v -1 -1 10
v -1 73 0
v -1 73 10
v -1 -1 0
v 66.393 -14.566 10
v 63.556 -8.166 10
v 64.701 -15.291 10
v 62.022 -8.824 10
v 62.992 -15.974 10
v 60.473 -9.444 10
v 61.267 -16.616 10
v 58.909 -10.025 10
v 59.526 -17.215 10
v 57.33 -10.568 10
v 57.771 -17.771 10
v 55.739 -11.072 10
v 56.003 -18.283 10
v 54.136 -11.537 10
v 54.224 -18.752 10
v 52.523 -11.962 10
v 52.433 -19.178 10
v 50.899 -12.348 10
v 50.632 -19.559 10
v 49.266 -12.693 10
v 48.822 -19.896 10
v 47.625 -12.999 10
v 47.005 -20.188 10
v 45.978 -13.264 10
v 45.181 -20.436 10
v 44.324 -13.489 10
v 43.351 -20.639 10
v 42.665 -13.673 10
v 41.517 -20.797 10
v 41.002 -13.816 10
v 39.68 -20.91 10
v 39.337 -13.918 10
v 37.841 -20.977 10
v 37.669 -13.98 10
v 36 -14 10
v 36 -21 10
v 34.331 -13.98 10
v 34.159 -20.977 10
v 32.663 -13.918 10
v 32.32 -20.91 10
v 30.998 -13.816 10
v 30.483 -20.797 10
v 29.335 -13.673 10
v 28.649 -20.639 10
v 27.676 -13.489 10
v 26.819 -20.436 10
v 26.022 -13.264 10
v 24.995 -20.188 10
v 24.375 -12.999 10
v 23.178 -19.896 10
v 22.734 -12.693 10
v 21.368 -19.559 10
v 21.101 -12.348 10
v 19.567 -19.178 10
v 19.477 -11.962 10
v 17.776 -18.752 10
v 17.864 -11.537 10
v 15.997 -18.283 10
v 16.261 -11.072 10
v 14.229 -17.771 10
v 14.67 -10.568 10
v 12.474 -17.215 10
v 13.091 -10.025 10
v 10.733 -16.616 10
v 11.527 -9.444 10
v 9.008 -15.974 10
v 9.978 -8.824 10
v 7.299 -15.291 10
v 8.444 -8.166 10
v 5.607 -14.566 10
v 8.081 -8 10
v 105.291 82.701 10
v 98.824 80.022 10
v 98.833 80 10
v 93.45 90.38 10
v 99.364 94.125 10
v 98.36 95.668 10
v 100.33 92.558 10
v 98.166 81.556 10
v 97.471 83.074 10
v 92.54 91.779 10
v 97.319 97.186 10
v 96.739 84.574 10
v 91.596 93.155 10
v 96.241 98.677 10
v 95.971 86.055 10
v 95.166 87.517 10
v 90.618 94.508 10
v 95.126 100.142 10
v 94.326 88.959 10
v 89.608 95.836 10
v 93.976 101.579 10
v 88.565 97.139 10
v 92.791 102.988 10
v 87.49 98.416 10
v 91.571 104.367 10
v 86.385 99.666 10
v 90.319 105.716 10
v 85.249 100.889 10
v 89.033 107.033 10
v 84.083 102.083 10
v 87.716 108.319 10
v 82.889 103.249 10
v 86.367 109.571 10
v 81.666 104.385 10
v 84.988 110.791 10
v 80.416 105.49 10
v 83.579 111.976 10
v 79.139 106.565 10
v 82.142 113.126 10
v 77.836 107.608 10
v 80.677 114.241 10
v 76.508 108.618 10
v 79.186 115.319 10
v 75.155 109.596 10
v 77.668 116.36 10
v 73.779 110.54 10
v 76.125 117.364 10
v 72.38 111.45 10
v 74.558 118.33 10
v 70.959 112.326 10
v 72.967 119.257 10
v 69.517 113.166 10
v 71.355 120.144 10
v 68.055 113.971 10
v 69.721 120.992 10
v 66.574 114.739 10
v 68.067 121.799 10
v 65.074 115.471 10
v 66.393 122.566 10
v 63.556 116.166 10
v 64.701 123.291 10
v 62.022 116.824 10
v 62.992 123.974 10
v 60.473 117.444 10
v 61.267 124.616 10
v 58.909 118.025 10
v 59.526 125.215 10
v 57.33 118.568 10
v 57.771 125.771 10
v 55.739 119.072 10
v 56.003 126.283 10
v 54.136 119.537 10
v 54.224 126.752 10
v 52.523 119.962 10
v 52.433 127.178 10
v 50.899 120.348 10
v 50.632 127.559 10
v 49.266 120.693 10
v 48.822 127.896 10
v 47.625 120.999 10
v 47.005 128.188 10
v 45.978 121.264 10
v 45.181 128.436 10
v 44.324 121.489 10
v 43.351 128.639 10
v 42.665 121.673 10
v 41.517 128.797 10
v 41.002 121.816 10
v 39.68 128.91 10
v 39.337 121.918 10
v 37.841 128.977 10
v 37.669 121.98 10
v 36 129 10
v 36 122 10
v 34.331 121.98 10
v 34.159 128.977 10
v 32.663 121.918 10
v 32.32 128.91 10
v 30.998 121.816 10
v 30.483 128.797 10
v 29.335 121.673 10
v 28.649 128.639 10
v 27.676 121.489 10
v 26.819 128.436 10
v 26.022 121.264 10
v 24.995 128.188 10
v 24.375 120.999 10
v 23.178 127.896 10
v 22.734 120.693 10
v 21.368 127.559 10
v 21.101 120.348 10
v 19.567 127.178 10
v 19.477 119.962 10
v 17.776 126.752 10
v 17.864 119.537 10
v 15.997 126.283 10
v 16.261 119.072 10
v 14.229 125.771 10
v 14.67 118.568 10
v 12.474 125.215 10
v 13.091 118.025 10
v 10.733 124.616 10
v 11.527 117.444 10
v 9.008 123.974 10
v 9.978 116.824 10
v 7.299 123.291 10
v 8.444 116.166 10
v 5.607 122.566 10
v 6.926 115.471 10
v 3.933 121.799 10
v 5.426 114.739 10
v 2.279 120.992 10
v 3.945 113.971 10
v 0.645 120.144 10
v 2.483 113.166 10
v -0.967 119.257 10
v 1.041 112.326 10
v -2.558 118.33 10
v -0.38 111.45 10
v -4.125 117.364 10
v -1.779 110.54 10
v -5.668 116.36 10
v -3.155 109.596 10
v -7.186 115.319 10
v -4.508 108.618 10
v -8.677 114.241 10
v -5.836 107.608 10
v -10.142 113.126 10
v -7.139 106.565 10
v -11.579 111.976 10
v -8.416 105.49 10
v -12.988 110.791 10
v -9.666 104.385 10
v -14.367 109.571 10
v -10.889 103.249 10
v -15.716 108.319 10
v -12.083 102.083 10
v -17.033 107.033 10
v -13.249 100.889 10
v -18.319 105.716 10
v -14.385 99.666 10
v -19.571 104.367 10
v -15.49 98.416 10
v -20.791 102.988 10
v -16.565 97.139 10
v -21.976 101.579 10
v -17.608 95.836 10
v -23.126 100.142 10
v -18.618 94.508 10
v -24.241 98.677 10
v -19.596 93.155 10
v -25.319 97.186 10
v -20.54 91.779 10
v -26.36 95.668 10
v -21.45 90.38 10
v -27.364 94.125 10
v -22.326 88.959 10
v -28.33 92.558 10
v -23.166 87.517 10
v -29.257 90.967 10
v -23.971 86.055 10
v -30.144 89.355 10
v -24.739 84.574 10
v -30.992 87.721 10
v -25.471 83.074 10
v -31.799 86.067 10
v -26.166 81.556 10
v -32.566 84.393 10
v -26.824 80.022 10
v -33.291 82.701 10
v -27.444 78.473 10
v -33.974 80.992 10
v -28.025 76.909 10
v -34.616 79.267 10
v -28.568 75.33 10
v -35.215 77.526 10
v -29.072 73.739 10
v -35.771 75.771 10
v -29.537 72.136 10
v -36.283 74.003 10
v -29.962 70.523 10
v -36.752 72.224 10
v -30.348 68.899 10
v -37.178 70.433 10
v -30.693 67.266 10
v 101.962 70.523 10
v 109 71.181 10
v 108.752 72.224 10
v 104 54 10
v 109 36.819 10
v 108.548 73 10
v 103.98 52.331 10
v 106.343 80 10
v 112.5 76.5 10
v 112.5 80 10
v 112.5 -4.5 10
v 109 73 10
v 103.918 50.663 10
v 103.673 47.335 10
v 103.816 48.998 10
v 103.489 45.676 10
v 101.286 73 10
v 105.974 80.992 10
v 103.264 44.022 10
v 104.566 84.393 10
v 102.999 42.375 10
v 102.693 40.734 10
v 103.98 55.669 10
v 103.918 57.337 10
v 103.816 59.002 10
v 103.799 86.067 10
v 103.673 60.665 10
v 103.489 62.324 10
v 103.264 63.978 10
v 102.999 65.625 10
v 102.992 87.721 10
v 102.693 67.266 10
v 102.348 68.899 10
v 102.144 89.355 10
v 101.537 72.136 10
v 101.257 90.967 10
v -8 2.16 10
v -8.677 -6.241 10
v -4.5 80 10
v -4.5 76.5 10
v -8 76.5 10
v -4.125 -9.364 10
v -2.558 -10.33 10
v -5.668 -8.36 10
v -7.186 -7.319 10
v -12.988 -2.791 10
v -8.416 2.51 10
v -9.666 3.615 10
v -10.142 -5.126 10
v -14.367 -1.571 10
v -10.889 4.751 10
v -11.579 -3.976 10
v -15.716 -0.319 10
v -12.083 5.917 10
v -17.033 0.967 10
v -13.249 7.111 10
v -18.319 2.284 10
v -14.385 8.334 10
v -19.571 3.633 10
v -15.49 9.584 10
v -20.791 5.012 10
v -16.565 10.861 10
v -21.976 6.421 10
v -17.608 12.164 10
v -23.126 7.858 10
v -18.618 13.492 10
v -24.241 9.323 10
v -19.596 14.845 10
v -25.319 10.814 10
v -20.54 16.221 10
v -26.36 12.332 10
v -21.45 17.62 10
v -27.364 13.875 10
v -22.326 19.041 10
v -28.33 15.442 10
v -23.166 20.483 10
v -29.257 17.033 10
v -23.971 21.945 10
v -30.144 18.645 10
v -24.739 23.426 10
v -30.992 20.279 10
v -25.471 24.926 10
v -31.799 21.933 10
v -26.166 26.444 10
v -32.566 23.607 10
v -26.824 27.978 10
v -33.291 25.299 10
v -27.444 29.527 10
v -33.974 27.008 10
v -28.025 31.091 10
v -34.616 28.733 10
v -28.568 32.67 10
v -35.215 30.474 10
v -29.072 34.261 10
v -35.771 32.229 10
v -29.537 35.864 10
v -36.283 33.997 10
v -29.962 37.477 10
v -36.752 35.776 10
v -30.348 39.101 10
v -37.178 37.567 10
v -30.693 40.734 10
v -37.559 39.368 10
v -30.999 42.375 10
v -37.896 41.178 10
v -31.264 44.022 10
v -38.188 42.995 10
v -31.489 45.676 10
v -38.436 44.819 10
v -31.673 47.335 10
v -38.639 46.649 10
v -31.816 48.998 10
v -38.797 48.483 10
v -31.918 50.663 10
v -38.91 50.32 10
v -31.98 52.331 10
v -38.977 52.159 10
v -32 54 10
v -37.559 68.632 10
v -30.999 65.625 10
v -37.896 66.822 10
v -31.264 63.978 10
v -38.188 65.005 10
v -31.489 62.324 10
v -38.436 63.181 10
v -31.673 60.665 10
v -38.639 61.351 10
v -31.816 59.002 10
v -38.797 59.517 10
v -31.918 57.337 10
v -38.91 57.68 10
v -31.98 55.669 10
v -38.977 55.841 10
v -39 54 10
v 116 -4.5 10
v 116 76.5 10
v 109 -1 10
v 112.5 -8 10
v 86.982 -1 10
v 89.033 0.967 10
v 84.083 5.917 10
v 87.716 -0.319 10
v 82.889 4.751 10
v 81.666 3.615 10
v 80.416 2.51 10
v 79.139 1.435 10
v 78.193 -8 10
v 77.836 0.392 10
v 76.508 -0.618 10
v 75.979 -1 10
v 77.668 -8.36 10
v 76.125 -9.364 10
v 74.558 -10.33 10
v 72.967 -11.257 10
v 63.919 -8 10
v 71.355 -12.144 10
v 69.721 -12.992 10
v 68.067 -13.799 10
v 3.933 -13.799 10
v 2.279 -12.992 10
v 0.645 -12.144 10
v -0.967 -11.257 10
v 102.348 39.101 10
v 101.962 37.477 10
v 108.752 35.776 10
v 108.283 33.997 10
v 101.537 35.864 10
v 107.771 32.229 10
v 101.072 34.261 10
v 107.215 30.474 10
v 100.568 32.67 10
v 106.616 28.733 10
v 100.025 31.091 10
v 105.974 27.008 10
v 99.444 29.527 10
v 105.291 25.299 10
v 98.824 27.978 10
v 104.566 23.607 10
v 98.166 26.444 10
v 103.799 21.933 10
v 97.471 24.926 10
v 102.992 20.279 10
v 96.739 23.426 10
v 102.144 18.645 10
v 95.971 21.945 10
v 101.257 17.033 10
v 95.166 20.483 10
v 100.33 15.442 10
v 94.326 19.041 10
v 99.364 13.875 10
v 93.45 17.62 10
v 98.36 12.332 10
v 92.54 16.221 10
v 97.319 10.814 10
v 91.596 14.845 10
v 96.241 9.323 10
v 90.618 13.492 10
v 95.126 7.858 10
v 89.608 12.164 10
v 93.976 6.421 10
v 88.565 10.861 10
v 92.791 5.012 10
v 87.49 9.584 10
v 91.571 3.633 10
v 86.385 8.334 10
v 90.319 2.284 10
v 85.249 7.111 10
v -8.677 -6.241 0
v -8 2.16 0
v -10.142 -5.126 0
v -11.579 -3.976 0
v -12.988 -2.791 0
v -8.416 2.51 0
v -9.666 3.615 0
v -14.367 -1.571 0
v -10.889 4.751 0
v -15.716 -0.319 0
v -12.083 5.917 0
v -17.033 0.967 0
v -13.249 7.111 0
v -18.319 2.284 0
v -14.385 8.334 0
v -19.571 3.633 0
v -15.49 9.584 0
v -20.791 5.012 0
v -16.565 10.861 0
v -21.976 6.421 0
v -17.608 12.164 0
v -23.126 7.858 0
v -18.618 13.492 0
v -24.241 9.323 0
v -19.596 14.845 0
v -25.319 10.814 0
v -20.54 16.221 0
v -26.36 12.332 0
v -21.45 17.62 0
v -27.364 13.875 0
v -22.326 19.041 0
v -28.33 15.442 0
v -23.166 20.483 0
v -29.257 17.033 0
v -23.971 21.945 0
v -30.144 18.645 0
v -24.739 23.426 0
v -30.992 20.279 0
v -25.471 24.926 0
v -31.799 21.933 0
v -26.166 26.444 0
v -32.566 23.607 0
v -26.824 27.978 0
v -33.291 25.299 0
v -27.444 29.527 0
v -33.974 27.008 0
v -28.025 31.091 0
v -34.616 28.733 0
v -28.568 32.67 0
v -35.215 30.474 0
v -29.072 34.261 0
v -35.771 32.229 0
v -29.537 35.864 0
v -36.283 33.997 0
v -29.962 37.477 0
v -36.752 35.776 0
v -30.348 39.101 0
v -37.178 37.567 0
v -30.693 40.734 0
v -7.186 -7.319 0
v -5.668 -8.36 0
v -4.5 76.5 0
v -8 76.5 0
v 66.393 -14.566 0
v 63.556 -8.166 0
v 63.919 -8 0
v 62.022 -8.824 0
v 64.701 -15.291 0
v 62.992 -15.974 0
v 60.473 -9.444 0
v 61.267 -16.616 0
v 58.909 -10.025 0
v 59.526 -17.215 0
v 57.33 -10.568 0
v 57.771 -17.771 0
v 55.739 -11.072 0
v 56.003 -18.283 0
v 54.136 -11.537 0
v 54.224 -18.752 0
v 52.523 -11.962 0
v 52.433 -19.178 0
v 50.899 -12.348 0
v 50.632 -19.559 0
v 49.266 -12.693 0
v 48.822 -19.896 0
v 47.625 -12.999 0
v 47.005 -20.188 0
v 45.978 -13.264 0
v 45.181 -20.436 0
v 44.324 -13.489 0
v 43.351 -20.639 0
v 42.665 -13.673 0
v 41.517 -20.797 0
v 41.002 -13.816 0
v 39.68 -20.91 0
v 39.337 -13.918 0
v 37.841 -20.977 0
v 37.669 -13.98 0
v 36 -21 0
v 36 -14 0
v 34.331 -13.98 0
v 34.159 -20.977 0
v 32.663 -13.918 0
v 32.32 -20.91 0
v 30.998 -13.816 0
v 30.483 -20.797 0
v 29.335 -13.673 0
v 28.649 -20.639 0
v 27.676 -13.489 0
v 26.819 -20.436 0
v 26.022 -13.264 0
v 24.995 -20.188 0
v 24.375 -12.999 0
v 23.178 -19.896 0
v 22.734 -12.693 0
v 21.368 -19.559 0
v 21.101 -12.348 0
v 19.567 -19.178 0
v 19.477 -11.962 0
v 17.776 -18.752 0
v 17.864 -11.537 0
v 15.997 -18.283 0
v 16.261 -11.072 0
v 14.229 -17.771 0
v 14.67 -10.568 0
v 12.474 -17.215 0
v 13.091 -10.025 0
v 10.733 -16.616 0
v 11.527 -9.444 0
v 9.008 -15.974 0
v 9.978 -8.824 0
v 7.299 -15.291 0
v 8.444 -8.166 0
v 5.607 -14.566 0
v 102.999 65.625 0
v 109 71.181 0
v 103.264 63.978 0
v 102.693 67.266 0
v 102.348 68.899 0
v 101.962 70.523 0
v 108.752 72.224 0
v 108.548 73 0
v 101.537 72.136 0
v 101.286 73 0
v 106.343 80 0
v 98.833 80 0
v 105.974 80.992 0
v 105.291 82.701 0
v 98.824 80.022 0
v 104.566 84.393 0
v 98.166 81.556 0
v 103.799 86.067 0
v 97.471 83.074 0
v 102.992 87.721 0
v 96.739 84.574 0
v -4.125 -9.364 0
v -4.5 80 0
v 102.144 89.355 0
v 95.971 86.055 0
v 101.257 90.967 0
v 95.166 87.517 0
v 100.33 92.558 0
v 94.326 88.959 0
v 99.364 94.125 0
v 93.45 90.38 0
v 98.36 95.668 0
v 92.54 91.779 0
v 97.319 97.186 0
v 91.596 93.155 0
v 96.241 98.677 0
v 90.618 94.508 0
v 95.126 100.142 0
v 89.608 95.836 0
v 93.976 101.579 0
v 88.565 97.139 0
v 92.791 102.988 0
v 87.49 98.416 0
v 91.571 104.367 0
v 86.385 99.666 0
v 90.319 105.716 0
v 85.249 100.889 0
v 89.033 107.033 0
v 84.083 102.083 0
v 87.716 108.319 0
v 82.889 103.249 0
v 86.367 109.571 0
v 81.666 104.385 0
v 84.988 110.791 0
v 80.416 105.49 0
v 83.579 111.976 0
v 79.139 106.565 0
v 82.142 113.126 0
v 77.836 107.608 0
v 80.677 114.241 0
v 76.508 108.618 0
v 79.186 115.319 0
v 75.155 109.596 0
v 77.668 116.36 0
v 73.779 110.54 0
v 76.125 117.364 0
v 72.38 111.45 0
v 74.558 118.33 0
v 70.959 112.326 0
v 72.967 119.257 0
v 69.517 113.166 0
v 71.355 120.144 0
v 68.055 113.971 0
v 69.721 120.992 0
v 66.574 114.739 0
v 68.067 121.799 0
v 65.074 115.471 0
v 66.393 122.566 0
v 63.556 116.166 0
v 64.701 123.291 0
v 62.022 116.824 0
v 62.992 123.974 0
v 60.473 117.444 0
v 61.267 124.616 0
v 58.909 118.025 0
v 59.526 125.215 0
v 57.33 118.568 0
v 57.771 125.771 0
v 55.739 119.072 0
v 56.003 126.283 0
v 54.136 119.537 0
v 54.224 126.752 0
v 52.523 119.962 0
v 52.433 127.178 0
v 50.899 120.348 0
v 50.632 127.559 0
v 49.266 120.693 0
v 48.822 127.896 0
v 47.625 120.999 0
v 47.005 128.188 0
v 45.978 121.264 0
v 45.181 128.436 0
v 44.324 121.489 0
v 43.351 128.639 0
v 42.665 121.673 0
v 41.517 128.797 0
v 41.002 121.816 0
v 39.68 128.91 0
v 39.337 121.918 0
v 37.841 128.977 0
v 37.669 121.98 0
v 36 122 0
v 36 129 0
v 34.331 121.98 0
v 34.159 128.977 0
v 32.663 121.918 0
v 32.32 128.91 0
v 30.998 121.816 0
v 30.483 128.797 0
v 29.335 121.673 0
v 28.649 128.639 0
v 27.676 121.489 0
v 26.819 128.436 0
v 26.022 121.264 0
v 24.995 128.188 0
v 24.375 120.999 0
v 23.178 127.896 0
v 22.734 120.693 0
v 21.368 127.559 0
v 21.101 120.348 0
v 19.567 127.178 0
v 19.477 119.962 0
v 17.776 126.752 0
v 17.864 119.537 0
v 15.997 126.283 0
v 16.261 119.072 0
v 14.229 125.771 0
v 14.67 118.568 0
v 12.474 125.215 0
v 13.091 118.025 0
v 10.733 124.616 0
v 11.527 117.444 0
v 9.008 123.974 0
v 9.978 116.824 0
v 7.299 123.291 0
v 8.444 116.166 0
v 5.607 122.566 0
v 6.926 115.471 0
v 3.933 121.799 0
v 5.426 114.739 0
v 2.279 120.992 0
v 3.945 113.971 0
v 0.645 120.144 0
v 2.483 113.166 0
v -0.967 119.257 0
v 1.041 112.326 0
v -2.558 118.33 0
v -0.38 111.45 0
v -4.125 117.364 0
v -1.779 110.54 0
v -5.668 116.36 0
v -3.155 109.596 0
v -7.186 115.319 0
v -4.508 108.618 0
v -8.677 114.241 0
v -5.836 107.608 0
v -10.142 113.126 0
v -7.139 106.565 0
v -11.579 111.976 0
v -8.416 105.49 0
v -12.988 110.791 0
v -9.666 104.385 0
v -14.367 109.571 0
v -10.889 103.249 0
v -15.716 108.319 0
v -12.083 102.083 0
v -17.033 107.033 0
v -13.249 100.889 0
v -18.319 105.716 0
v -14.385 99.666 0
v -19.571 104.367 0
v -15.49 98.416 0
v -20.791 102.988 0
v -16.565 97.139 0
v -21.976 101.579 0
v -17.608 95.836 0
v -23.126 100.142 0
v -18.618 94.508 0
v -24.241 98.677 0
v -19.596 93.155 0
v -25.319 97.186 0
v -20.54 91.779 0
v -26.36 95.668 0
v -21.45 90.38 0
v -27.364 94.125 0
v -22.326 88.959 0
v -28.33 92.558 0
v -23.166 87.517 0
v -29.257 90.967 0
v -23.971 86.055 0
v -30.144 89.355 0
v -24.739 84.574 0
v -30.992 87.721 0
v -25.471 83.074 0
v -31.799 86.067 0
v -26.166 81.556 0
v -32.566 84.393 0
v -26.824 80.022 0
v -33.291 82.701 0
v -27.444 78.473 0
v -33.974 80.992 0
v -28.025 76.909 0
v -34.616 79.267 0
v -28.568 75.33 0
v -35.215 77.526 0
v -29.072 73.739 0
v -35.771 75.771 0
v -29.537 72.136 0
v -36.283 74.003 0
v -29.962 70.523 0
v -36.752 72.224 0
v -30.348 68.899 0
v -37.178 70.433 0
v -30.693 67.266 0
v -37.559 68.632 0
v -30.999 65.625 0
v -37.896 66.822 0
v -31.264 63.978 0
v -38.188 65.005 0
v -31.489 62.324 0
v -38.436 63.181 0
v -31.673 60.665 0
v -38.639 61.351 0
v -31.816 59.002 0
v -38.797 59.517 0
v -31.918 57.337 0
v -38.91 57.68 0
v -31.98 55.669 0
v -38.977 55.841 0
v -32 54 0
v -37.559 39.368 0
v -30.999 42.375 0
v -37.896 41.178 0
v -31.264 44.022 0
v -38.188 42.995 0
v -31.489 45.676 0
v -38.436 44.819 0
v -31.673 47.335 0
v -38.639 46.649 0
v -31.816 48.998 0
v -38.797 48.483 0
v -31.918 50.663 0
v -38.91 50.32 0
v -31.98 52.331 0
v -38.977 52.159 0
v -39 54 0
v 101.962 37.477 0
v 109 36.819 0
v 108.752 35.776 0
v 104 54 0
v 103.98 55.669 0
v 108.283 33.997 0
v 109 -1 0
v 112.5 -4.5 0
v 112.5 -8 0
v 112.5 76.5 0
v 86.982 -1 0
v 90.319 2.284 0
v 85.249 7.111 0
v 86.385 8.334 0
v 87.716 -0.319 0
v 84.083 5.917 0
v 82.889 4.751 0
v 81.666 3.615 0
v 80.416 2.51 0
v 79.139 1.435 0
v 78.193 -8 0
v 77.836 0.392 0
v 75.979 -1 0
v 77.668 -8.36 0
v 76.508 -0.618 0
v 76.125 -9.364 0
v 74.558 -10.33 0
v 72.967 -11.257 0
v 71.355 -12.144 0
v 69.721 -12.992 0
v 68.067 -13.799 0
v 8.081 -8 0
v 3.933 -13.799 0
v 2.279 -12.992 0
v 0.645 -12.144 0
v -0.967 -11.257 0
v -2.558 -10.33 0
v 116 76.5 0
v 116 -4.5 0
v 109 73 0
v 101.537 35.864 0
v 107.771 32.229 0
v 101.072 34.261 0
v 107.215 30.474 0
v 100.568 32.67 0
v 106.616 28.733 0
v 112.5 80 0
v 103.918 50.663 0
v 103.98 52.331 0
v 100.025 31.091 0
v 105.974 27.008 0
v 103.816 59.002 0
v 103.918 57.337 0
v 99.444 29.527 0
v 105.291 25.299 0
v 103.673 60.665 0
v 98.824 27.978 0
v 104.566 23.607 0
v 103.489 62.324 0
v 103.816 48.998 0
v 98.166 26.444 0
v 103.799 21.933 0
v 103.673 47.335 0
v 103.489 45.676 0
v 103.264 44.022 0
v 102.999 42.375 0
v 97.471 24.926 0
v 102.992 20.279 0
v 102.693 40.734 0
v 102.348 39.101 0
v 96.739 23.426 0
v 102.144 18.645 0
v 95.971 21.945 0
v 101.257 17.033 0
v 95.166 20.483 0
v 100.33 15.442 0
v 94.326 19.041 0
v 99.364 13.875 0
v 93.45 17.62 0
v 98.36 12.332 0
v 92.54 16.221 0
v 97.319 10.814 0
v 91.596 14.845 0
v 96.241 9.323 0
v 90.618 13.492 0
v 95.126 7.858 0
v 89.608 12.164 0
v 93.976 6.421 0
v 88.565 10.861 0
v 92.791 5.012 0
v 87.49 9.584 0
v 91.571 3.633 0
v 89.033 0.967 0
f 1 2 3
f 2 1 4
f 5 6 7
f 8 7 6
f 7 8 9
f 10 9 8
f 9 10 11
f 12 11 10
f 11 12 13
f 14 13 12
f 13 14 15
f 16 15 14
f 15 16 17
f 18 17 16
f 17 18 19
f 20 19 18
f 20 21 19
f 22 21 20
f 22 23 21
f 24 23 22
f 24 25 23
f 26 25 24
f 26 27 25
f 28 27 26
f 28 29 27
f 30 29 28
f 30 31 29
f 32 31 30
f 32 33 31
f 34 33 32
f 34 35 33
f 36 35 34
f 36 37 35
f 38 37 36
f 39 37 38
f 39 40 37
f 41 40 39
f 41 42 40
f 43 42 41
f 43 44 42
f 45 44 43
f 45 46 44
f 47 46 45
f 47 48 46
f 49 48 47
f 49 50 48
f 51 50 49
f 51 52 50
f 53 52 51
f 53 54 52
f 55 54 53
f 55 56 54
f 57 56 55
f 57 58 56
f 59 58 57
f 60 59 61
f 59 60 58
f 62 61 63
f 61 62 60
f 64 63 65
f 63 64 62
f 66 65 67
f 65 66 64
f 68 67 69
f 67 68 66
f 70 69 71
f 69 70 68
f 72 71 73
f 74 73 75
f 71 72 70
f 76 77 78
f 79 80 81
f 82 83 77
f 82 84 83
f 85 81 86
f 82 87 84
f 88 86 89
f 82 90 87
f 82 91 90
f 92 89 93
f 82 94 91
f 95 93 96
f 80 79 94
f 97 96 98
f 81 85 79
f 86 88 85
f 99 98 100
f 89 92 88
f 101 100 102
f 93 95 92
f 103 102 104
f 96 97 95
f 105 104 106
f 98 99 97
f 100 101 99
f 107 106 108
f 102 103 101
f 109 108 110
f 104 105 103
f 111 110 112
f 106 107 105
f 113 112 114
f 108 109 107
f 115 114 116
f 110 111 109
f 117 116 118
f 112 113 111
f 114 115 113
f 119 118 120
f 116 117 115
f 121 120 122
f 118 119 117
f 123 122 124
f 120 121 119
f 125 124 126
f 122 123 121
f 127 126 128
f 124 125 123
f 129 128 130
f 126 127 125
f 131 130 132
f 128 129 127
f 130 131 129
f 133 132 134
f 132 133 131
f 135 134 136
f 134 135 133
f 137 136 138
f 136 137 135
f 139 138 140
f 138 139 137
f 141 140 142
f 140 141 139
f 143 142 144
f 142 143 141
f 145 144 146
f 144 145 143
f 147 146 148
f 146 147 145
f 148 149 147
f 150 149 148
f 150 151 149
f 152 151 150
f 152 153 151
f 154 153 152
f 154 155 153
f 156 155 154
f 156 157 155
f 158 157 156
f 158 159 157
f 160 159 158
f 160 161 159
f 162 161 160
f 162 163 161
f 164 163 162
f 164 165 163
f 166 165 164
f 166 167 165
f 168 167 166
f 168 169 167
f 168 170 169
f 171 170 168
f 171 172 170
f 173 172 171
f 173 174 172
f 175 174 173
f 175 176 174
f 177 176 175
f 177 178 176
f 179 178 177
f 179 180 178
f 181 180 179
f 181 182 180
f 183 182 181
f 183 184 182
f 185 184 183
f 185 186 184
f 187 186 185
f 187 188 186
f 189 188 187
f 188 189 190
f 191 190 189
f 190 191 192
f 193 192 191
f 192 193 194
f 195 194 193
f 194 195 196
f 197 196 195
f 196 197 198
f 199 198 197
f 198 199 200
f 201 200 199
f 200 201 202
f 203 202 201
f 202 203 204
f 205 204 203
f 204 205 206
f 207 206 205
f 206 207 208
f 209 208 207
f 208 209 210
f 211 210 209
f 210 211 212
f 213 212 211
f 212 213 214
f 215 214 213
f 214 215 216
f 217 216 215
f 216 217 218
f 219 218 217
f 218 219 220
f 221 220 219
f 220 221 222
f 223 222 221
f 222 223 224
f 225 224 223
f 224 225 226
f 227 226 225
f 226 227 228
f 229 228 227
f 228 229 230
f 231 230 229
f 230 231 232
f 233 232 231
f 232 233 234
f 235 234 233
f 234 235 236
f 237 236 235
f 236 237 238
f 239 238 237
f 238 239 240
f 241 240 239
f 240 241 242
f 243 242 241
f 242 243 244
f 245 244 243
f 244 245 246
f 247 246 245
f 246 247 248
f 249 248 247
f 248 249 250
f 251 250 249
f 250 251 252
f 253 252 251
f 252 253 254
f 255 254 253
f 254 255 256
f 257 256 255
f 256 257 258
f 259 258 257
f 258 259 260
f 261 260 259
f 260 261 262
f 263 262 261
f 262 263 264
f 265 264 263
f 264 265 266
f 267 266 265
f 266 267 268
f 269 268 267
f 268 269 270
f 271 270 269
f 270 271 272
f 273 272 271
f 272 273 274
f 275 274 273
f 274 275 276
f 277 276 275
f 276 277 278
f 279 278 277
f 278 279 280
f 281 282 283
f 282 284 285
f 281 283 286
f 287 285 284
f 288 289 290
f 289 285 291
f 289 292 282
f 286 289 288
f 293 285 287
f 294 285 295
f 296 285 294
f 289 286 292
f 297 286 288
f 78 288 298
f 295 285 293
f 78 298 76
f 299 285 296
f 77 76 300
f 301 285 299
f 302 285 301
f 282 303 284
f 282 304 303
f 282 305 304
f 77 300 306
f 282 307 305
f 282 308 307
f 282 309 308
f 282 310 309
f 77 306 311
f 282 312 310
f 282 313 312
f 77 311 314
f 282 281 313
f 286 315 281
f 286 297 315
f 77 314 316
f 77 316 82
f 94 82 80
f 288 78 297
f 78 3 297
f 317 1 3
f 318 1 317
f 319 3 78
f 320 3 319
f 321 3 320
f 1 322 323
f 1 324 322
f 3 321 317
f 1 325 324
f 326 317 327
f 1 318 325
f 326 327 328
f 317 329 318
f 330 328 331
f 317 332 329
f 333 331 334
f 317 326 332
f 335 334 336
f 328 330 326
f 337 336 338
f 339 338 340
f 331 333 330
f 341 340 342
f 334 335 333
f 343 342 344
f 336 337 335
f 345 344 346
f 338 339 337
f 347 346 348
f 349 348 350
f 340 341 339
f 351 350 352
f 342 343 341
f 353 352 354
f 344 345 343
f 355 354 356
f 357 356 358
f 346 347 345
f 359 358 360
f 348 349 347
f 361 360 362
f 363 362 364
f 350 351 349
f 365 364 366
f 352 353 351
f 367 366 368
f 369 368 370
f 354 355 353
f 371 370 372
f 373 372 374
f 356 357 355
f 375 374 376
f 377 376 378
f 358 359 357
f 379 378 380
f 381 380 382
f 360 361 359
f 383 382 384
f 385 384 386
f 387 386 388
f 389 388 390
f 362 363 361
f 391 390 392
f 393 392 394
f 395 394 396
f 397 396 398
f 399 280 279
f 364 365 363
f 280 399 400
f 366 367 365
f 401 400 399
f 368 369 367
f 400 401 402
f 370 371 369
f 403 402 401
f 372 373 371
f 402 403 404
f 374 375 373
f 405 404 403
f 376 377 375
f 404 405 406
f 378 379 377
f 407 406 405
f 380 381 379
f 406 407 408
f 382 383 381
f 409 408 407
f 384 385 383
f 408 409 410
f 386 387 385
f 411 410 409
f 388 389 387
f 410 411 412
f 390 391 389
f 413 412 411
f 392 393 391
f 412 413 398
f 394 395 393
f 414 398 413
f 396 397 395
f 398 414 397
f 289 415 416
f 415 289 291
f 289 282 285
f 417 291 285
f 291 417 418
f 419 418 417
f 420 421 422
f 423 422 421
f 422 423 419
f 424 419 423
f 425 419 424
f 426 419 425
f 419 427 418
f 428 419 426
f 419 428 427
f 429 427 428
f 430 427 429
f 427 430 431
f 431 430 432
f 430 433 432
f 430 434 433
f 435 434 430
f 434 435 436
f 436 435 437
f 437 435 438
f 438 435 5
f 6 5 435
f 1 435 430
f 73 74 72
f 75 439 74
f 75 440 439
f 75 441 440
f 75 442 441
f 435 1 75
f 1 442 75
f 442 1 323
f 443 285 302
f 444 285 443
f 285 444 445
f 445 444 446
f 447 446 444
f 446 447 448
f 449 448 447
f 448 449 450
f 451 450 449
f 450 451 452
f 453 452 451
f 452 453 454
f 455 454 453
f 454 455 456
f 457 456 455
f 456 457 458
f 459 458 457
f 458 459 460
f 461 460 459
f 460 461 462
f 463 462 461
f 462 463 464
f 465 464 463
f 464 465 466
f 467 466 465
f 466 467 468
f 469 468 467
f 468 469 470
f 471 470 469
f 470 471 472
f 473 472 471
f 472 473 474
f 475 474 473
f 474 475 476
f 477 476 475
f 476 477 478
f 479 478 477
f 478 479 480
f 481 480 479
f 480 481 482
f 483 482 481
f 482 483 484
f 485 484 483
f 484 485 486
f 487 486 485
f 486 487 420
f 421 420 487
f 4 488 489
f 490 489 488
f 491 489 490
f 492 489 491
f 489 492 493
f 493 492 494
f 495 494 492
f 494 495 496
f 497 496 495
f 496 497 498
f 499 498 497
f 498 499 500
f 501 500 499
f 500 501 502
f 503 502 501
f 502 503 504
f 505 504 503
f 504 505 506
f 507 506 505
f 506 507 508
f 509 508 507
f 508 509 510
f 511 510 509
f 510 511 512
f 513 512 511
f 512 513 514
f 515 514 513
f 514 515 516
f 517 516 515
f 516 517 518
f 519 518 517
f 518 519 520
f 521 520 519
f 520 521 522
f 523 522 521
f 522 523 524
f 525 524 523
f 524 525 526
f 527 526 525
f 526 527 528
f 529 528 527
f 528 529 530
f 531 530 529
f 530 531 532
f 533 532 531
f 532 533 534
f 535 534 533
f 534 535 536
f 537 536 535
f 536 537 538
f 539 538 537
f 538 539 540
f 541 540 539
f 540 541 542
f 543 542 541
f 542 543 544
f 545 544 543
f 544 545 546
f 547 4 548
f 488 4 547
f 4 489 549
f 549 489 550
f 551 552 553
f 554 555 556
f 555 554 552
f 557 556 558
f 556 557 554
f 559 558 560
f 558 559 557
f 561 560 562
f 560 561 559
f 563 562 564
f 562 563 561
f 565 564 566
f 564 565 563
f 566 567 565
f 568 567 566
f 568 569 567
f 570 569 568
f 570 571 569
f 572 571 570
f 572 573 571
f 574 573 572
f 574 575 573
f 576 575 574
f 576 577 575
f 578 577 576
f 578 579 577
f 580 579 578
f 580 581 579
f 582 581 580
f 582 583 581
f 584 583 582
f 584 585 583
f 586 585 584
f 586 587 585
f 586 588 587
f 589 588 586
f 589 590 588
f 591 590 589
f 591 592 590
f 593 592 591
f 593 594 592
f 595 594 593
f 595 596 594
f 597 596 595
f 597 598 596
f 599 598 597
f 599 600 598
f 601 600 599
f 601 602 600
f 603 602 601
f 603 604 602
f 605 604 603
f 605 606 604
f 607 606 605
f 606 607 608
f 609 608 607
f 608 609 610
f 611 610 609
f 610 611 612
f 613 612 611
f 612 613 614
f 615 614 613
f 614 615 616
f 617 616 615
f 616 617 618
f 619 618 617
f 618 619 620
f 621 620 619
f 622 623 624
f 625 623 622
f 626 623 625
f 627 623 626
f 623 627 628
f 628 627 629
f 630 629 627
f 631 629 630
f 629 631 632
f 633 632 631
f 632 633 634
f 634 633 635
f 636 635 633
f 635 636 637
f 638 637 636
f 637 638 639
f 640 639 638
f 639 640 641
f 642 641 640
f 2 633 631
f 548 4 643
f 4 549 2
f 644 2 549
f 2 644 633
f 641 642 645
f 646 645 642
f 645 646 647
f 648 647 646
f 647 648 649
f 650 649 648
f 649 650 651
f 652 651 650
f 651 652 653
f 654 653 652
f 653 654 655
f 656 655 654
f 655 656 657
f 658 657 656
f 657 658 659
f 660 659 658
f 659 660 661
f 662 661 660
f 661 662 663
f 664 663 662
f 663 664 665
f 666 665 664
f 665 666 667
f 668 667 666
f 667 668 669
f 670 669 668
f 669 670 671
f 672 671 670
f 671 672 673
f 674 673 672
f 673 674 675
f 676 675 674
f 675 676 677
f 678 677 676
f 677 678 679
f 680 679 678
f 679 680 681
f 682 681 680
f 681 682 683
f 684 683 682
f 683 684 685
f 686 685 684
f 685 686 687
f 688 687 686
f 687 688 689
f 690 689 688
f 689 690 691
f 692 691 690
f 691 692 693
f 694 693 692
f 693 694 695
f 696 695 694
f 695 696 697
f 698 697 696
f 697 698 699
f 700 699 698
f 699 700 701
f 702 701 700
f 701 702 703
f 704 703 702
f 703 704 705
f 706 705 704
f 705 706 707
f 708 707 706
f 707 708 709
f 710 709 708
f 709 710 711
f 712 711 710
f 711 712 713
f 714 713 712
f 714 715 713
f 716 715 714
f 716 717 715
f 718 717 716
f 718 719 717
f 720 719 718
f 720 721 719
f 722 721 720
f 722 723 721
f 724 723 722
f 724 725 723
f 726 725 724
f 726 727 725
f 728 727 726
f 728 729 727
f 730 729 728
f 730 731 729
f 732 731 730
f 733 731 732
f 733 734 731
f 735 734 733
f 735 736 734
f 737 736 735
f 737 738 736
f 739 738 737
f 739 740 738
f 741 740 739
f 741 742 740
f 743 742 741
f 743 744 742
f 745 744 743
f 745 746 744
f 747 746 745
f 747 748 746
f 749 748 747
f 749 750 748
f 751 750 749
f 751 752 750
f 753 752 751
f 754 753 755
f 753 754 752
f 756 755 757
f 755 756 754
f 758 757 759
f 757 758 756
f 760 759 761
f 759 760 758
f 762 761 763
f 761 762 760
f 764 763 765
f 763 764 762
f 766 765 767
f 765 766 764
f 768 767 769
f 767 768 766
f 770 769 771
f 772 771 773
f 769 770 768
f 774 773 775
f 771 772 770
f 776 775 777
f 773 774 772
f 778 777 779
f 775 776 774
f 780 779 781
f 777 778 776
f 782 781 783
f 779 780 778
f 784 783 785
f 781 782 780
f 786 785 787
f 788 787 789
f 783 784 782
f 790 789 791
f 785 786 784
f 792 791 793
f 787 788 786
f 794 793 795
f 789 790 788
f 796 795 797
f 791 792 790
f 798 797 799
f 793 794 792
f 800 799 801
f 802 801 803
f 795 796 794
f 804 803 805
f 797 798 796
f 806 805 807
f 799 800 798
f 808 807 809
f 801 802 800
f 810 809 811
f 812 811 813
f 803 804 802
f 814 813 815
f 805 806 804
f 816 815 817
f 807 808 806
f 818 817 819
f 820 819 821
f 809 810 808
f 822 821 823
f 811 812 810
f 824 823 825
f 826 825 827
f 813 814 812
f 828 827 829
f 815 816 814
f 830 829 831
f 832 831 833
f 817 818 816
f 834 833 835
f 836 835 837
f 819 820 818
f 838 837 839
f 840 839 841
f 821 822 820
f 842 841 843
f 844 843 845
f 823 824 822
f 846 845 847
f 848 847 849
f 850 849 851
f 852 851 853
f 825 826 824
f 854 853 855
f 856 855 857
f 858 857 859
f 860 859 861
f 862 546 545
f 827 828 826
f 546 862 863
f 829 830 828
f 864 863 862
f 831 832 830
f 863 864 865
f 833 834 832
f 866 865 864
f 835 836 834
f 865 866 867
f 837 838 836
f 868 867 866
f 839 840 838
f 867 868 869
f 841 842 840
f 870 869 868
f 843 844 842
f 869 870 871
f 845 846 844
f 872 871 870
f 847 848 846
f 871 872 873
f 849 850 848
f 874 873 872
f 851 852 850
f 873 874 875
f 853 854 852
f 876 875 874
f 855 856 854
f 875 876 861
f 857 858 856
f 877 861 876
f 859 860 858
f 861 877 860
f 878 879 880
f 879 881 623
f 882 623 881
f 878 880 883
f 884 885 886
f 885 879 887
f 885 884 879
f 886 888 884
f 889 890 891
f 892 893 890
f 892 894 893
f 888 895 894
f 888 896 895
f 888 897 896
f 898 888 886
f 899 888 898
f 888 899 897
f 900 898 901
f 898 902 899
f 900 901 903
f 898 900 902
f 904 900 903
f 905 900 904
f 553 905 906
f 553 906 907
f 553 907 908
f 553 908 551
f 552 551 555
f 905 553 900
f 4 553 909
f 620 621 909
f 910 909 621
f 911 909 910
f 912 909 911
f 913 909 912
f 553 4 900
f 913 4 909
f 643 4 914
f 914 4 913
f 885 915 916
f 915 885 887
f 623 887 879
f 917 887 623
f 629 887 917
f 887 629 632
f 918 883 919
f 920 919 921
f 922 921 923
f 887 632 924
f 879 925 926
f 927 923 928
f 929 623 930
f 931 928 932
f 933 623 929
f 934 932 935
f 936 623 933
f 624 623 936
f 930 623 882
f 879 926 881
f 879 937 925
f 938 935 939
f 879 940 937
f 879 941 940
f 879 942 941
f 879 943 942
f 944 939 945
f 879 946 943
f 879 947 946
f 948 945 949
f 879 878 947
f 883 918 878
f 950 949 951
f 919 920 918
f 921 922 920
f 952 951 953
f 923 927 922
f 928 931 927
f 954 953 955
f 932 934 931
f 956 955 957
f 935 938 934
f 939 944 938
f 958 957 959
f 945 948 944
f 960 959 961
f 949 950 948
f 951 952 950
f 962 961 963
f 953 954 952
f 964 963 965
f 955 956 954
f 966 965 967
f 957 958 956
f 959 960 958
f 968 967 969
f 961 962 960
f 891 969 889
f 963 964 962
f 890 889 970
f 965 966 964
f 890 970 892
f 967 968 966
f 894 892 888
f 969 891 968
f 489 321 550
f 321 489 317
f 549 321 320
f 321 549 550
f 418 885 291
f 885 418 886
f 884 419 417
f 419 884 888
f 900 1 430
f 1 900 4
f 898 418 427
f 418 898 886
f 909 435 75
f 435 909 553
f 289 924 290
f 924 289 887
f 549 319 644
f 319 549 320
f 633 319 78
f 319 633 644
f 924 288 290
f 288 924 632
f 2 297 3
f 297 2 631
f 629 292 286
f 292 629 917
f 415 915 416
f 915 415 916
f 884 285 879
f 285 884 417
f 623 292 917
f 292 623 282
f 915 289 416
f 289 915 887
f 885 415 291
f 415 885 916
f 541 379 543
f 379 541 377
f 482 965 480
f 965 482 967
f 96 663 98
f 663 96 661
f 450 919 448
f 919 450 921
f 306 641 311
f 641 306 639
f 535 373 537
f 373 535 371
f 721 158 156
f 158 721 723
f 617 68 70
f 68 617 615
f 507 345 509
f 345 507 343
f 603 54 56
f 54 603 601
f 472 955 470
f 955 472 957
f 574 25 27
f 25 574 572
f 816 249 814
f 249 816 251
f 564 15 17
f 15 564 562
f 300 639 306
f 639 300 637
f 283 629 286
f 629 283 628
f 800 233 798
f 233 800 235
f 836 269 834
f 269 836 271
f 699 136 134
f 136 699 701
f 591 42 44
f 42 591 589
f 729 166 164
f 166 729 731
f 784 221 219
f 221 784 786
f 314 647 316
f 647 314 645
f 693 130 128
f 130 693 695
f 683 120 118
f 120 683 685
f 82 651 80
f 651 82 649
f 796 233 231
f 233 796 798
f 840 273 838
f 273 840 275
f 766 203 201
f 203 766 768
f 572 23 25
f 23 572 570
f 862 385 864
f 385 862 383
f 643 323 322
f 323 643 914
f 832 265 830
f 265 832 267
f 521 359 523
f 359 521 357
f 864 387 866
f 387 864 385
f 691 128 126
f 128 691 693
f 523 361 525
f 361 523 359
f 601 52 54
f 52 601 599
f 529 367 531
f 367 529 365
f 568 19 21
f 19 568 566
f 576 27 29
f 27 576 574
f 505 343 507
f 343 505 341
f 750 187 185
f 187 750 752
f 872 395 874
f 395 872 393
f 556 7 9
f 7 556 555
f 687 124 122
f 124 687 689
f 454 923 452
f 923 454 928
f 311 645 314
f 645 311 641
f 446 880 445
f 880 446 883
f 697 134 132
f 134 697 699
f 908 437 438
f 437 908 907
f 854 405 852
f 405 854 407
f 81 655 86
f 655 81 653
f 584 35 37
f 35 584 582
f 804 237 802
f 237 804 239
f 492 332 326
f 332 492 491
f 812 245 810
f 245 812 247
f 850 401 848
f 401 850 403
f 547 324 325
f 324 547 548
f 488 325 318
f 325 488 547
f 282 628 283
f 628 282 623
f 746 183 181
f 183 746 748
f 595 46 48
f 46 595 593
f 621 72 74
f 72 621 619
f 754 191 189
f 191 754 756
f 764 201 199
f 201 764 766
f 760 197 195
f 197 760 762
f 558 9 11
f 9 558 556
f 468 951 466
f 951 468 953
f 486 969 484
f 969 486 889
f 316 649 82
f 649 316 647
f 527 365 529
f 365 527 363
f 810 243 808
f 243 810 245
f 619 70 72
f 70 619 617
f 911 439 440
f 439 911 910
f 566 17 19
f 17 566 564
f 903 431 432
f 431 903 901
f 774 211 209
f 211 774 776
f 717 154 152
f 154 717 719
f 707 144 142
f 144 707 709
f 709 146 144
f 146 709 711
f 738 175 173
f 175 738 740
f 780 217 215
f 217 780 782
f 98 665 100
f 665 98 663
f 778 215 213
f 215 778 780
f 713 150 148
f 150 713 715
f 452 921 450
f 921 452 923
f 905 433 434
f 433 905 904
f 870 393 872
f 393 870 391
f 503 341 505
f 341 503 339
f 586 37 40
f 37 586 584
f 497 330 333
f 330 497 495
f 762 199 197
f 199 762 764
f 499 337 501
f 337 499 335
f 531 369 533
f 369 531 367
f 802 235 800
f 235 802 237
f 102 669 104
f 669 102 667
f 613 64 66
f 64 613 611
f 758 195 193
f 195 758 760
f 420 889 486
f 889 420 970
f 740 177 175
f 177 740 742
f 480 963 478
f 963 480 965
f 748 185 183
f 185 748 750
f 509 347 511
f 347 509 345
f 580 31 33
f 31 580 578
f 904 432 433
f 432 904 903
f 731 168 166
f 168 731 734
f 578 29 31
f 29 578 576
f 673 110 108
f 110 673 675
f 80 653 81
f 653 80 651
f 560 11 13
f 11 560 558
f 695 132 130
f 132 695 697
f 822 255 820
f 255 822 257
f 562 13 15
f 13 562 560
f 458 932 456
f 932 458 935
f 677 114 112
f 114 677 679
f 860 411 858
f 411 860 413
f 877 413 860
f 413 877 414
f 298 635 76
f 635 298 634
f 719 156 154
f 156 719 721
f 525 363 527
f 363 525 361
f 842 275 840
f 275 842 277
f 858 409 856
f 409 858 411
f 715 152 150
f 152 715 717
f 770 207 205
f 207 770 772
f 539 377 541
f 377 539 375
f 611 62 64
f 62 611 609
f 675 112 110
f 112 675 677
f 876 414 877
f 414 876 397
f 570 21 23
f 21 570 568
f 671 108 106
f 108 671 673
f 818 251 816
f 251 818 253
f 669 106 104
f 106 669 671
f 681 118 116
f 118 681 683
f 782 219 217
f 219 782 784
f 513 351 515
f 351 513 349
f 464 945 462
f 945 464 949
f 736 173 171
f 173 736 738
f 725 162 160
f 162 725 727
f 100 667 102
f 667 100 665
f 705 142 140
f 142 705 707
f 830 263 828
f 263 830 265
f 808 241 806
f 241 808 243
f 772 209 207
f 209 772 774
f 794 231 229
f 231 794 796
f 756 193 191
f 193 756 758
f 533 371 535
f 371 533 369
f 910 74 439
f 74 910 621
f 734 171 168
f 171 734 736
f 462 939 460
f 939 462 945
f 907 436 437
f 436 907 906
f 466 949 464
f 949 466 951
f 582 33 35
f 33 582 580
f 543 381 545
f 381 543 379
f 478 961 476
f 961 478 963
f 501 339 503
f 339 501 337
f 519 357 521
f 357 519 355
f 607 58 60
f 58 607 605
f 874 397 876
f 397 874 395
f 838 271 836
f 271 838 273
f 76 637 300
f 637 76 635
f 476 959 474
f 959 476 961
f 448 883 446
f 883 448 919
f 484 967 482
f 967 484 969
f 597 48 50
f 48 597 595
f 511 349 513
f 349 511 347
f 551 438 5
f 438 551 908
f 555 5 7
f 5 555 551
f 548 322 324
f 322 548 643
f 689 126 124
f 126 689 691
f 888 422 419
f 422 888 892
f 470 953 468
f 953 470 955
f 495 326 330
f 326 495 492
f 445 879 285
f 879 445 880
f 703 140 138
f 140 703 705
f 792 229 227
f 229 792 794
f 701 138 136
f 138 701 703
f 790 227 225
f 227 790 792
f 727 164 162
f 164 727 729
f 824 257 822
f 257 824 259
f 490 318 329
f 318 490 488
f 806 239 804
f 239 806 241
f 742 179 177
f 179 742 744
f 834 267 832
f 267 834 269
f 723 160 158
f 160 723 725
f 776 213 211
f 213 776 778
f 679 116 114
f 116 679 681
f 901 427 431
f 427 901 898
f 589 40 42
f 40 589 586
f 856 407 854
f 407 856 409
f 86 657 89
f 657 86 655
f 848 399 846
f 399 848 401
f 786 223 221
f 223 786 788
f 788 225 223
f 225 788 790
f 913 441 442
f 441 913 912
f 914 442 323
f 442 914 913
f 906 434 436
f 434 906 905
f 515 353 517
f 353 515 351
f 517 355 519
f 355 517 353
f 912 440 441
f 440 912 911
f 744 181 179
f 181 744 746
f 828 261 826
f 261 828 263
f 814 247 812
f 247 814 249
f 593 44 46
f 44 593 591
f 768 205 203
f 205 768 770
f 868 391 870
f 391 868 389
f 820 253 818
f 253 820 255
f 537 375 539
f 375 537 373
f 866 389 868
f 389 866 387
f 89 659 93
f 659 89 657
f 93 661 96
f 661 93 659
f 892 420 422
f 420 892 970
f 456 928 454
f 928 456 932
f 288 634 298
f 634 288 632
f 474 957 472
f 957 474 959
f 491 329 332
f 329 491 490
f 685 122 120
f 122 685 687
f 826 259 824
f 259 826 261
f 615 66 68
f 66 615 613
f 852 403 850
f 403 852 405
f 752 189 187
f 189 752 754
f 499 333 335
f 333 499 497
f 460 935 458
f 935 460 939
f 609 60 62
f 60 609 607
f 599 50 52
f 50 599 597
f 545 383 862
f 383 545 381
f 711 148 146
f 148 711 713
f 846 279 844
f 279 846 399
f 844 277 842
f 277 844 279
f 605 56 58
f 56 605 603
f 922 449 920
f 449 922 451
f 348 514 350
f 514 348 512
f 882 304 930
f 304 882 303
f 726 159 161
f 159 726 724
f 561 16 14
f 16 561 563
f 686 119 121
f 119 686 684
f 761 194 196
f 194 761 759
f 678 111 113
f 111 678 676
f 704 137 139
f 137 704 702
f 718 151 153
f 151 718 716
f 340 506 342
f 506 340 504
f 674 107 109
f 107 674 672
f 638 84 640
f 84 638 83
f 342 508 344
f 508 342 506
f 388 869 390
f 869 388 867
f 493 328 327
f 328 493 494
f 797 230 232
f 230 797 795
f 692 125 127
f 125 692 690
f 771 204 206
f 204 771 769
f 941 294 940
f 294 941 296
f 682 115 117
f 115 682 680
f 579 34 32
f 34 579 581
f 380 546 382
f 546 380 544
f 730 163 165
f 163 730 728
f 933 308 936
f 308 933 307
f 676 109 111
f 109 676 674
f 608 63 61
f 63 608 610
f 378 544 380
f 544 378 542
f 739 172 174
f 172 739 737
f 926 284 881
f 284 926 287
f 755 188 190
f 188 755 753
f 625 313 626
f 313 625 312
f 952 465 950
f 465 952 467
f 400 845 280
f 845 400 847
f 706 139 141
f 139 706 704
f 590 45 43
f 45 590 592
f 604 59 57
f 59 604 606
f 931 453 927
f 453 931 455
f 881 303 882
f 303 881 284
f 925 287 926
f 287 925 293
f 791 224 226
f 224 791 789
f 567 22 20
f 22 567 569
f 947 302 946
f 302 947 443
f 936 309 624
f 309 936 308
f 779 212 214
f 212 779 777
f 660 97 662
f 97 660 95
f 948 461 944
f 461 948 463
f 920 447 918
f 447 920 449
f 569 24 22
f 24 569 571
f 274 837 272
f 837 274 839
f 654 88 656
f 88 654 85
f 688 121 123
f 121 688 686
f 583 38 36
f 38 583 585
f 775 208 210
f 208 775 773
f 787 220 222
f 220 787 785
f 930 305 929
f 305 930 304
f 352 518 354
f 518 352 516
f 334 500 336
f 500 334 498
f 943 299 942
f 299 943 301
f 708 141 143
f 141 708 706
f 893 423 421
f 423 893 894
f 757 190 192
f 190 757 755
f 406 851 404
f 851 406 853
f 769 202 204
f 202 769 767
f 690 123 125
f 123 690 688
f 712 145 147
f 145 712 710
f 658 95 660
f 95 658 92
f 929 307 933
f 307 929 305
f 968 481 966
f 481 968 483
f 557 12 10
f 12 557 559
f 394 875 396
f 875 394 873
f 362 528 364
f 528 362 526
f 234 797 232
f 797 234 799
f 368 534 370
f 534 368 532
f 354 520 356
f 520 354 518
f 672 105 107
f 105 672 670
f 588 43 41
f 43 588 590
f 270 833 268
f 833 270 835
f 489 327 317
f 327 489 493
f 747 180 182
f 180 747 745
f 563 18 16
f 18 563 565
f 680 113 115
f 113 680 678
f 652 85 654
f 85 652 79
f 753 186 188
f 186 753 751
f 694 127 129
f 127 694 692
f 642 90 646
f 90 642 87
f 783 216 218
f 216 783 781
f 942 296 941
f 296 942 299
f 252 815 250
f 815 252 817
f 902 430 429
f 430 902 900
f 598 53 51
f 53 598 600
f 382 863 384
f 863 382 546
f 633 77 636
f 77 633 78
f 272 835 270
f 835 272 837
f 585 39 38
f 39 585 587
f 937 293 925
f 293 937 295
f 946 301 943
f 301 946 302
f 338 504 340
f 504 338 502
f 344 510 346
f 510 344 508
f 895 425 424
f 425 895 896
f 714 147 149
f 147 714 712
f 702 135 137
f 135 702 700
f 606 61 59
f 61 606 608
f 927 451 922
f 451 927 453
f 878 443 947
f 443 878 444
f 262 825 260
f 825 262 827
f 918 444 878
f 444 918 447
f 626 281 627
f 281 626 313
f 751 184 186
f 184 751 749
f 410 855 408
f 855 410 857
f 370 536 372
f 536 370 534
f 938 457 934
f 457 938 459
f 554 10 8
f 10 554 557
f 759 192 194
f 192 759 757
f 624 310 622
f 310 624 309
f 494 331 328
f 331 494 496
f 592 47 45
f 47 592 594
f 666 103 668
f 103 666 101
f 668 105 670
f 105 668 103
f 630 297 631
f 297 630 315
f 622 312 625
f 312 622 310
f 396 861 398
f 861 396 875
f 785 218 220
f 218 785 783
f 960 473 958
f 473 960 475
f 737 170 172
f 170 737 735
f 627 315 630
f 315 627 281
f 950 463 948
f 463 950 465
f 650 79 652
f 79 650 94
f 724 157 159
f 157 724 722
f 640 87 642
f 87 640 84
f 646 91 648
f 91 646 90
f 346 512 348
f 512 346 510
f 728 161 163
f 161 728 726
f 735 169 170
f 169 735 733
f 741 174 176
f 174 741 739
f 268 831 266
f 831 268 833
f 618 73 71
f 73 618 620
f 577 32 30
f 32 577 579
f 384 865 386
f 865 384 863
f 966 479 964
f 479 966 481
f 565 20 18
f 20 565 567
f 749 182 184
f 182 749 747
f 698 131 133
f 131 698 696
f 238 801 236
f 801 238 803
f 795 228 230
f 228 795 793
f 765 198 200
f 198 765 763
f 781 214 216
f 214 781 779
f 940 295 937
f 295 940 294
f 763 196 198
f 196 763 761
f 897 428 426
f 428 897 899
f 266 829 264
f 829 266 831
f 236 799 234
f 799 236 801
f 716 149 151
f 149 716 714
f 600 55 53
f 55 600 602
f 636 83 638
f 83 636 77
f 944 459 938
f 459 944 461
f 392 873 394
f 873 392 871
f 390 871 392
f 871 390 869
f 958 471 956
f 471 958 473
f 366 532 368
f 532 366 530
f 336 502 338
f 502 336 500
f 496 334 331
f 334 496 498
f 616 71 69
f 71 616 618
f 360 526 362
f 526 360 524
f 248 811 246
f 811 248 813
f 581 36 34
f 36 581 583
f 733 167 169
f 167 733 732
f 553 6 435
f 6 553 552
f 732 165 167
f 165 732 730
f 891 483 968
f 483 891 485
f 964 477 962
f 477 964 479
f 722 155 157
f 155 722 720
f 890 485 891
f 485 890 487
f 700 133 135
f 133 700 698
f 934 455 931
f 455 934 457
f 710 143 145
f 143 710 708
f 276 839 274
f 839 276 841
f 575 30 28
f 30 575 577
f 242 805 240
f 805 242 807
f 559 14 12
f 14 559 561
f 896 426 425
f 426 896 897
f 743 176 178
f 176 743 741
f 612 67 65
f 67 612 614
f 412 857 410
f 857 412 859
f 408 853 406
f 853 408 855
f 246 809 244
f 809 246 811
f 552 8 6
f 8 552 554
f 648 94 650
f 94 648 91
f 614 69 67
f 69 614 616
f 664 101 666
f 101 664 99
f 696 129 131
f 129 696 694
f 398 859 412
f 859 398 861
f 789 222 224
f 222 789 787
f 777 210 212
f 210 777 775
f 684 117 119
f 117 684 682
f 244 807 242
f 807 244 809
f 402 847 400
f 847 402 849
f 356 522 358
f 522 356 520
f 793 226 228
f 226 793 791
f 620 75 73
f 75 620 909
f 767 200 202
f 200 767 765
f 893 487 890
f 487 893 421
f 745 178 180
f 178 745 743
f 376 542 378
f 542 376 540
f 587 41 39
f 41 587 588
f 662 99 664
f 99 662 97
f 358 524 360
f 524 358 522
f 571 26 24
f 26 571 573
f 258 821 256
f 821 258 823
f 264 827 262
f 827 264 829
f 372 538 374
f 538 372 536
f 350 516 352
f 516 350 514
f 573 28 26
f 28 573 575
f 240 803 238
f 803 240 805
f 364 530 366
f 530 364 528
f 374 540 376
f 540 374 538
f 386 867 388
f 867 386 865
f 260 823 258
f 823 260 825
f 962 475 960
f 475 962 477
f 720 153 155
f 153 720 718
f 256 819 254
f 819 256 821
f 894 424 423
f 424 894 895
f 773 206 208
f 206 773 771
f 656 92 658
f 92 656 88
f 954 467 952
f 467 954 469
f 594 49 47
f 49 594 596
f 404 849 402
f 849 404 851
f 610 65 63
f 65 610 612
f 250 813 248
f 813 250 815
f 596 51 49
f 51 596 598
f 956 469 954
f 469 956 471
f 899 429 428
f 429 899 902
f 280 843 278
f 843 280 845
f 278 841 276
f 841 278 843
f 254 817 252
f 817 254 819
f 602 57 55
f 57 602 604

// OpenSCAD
// Generated by SolidPython 1.1.3 on 2026-07-06 20:42:08


union() {
	union() {
		translate(v = [-4.5000000000, 36.0000000000, 5.0000000000]) {
			cube(center = true, size = [7, 81, 10]);
		}
		translate(v = [54.0000000000, -4.5000000000, 5.0000000000]) {
			cube(center = true, size = [117, 7, 10]);
		}
		translate(v = [0, 81]) {
			translate(v = [54.0000000000, -4.5000000000, 5.0000000000]) {
				cube(center = true, size = [117, 7, 10]);
			}
		}
		translate(v = [117, 0]) {
			translate(v = [-4.5000000000, 36.0000000000, 5.0000000000]) {
				cube(center = true, size = [7, 81, 10]);
			}
		}
	}
	translate(v = [36.0000000000, 54.0000000000]) {
		difference() {
			cylinder($fn = 256, h = 10, r = 75.0000000000);
			cylinder($fn = 256, h = 10, r = 68.0000000000);
		}
	}
}
/***********************************************
*********      SolidPython code:      **********
************************************************

"""SCAD file export functions.

This module provides functions for exporting OpenSCAD geometries to .scad files.
"""

from typing import Dict, Optional
from pathlib import Path
import solid

from .config import ExportConfiguration, FileNamingConfig


def export_scad(
    geometry: solid.OpenSCADObject, output_path: Path, header: Optional[str] = None
) -> Path:
    """Export geometry to SCAD file.

    Parameters
    ----------
    geometry : solid.OpenSCADObject
        Geometry to export.
    output_path : Path
        Output file path.
    header : str, optional
        Header comment to add to SCAD file.

    Returns
    -------
    Path
        Path to created SCAD file.

    Raises
    ------
    IOError
        If file cannot be written.

    Examples
    --------
    >>> from pathlib import Path
    >>> import solid
    >>>
    >>> geometry = solid.cube([10, 10, 10])
    >>> output_path = Path('output/device.scad')
    >>> export_scad(geometry, output_path)
    """
    # Ensure parent directory exists
    output_path.parent.mkdir(parents=True, exist_ok=True)

    # Render to file
    try:
        solid.scad_render_to_file(geometry, str(output_path))
    except Exception as e:
        raise IOError(f"Failed to write SCAD file to {output_path}: {e}")

    _normalize_scad_file(output_path)

    # Add header if provided
    if header:
        _add_header_to_scad(output_path, header)
        _normalize_scad_file(output_path)

    return output_path


def _normalize_scad_file(scad_path: Path) -> None:
    """Strip trailing whitespace from generated SCAD text."""
    content = scad_path.read_text()
    normalized = "\n".join(line.rstrip() for line in content.splitlines()) + "\n"
    if normalized != content:
        scad_path.write_text(normalized)


def export_multiple_scad(
    geometries: Dict[str, solid.OpenSCADObject],
    config: ExportConfiguration,
    naming_config: Optional[FileNamingConfig] = None,
) -> Dict[str, Path]:
    """Export multiple geometries to SCAD files.

    Parameters
    ----------
    geometries : dict
        Dictionary mapping prefixes to geometries.
        Keys are used as filename prefixes.
    config : ExportConfiguration
        Export configuration.
    naming_config : FileNamingConfig, optional
        File naming configuration.

    Returns
    -------
    dict
        Dictionary mapping prefixes to output paths.

    Examples
    --------
    >>> geometries = {
    ...     'wells': wells_geometry,
    ...     'channels': channels_geometry,
    ...     'device': device_geometry
    ... }
    >>> config = ExportConfiguration(output_directory=Path('output'))
    >>> paths = export_multiple_scad(geometries, config)
    """
    output_paths = {}

    for prefix, geometry in geometries.items():
        # Create naming config for this geometry
        if naming_config:
            file_config = FileNamingConfig(
                prefix=prefix,
                version=naming_config.version,
                grid_size=naming_config.grid_size,
                suffix=naming_config.suffix,
            )
        else:
            file_config = FileNamingConfig(prefix=prefix)

        # Generate filename
        filename = file_config.generate_filename("scad")
        output_path = config.get_output_path(filename)

        # Export
        export_scad(geometry, output_path)
        output_paths[prefix] = output_path

    return output_paths


def _add_header_to_scad(scad_path: Path, header: str):
    """Add header comment to existing SCAD file.

    Parameters
    ----------
    scad_path : Path
        Path to SCAD file.
    header : str
        Header text to add.
    """
    # Read existing content
    with open(scad_path, "r") as f:
        content = f.read()

    # Prepend header
    header_comment = f"// {header}\n\n"
    with open(scad_path, "w") as f:
        f.write(header_comment + content)


def generate_scad_header(
    device_name: str, version: Optional[str] = None, description: Optional[str] = None
) -> str:
    """Generate SCAD file header comment.

    Parameters
    ----------
    device_name : str
        Device name.
    version : str, optional
        Version string.
    description : str, optional
        Device description.

    Returns
    -------
    str
        Header comment text.

    Examples
    --------
    >>> header = generate_scad_header(
    ...     'Two Compartment Device',
    ...     version='v1',
    ...     description='96-well format with microchannels'
    ... )
    """
    lines = []
    lines.append("=" * 60)
    lines.append(f"Device: {device_name}")

    if version:
        lines.append(f"Version: {version}")

    if description:
        lines.append(f"Description: {description}")

    lines.append("Generated by OpenMFD")
    lines.append("=" * 60)

    return "\n".join(lines)


def validate_scad_file(scad_path: Path) -> bool:
    """Validate that SCAD file exists and is readable.

    Parameters
    ----------
    scad_path : Path
        Path to SCAD file.

    Returns
    -------
    bool
        True if file is valid, False otherwise.
    """
    if not scad_path.exists():
        return False

    if not scad_path.is_file():
        return False

    # Try to read file
    try:
        with open(scad_path, "r") as f:
            content = f.read()
        return len(content) > 0
    except Exception:
        return False


************************************************/
